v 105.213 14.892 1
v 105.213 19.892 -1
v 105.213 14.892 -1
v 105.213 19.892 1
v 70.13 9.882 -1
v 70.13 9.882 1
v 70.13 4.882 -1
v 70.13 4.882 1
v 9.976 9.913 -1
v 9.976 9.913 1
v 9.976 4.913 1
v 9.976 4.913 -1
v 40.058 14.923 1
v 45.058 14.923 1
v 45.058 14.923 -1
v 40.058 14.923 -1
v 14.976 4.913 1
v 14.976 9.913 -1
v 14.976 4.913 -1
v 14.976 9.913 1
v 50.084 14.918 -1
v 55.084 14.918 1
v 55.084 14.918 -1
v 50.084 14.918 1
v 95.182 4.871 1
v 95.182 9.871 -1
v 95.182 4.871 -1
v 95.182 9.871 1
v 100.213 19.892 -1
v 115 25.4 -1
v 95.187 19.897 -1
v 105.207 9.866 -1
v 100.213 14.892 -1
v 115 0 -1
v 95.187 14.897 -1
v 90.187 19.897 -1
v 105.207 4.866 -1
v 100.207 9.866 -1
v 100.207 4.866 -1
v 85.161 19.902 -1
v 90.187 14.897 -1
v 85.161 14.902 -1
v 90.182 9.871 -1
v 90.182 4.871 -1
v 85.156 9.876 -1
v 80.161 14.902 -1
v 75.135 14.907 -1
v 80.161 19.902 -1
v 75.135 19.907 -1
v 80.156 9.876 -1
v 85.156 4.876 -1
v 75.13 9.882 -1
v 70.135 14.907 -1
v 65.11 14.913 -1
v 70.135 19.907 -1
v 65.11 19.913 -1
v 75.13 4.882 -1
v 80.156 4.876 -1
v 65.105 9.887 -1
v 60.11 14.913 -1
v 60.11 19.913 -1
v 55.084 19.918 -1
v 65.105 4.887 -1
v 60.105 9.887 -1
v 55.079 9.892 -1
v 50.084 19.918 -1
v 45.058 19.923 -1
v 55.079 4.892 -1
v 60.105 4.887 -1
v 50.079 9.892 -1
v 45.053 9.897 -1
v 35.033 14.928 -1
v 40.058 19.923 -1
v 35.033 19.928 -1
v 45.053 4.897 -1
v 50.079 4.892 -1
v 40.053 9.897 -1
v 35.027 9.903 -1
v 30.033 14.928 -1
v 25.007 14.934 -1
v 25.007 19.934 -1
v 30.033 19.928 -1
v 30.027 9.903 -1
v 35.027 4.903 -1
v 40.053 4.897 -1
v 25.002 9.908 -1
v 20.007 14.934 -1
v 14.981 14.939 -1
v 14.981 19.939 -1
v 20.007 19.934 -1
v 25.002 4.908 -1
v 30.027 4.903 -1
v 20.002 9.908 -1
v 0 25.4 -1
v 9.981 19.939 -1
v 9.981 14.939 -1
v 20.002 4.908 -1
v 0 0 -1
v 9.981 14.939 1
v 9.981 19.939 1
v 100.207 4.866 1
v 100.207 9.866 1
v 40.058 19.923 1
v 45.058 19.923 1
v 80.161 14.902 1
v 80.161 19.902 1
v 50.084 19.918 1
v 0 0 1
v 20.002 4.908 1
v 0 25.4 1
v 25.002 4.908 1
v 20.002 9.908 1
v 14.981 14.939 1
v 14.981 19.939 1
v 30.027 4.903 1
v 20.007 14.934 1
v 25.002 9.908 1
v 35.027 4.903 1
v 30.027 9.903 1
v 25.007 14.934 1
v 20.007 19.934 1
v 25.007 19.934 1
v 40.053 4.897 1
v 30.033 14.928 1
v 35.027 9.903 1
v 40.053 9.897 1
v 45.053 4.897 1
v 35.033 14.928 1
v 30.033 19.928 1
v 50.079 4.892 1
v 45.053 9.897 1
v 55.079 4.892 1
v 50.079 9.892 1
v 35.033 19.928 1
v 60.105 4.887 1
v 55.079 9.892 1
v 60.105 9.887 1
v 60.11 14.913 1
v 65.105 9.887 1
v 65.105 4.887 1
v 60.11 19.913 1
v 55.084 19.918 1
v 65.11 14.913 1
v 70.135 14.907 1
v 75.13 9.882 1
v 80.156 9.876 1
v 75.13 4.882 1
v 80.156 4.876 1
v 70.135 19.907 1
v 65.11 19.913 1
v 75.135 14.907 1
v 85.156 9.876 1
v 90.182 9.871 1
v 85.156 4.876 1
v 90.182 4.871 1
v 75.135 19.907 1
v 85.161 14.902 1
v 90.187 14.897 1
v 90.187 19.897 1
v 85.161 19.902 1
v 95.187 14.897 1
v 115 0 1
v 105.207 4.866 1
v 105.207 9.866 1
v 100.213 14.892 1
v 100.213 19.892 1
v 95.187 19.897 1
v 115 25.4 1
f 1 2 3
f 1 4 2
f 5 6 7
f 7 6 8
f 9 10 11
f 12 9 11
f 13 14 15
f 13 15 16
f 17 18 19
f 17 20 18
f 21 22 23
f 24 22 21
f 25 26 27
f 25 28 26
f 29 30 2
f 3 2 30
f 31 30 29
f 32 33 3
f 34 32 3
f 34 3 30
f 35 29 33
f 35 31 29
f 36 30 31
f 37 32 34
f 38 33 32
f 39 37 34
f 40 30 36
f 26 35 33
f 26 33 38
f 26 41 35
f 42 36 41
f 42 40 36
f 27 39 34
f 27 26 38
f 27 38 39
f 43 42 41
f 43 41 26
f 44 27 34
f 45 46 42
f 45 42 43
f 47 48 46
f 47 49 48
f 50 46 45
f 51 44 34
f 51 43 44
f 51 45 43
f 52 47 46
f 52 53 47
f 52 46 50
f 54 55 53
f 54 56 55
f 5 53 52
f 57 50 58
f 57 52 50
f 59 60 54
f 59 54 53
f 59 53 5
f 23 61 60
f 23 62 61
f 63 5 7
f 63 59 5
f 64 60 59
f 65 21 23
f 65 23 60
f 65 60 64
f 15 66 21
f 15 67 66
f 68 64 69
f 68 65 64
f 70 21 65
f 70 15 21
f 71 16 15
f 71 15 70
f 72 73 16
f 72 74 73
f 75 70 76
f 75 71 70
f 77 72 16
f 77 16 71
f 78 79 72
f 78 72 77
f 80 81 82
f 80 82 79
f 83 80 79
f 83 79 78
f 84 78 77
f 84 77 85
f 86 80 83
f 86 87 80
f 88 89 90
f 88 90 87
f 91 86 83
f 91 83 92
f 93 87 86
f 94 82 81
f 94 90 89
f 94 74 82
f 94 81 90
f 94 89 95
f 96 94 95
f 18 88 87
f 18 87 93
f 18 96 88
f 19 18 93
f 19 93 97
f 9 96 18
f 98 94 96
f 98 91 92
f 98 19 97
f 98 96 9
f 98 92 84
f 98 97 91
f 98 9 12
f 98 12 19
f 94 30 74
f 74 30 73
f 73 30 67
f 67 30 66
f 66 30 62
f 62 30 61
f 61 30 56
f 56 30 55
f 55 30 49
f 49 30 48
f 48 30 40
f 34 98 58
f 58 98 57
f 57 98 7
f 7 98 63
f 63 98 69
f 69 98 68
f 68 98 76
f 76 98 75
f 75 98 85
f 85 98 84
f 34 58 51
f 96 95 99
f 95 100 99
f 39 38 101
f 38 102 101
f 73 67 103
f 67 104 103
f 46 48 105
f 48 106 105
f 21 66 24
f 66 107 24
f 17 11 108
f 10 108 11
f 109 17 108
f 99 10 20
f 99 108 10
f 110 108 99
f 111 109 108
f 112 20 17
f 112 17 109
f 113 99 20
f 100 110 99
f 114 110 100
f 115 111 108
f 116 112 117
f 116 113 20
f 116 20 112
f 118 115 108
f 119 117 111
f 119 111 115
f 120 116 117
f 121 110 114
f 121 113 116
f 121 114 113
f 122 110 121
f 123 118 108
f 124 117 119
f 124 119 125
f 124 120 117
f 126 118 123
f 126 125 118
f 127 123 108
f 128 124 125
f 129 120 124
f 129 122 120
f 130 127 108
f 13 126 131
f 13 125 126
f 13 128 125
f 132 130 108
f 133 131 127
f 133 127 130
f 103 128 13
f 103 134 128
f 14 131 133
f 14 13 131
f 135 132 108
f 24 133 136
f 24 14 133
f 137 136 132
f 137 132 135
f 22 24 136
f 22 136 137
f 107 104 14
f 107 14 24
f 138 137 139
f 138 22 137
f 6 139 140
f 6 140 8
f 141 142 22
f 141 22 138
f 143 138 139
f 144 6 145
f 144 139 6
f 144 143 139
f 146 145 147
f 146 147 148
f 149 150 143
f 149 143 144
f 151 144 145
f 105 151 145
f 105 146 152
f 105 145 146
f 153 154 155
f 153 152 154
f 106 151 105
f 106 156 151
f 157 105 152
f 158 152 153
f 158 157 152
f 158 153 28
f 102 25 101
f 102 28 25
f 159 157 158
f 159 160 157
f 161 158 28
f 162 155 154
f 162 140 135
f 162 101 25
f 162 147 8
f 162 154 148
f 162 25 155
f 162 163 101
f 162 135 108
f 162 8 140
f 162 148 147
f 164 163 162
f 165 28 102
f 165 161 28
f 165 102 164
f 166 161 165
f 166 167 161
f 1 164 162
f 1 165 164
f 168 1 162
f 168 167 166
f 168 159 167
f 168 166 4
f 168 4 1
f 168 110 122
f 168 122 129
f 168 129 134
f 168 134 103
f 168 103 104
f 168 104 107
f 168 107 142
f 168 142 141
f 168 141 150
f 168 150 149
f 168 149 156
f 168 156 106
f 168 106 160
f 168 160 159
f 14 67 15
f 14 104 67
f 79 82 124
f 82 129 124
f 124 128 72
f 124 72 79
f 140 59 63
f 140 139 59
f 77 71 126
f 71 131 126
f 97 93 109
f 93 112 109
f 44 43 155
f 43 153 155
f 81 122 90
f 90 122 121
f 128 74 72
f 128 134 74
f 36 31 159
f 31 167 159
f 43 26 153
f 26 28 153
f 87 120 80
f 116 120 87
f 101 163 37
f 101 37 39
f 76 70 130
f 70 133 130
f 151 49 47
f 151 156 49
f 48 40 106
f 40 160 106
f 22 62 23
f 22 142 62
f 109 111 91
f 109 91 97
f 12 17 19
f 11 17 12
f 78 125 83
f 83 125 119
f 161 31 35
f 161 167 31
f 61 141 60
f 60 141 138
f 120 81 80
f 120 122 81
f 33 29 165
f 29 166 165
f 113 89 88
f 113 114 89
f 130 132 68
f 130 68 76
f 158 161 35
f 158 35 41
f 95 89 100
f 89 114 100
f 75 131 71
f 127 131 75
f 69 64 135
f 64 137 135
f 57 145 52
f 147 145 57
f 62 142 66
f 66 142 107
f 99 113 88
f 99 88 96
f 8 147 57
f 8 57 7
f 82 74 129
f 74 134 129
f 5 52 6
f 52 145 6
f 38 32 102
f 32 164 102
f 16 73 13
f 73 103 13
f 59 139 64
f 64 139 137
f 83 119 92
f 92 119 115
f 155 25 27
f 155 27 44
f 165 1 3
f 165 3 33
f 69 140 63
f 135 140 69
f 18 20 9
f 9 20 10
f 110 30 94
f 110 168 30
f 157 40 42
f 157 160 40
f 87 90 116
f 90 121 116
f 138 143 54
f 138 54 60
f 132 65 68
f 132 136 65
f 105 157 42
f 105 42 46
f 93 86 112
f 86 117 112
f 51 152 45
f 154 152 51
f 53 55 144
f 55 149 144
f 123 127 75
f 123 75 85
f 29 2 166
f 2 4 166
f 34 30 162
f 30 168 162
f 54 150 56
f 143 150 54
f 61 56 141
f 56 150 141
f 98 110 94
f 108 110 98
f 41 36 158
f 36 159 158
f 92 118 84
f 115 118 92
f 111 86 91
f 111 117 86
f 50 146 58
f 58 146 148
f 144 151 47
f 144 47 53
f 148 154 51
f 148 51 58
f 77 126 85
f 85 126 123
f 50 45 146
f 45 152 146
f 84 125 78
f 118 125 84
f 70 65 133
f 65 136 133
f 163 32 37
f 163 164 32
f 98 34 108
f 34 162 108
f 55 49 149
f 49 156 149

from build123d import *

# Parameters (mm, degrees)
BOX_W               = 115
BOX_H               = 25.4
BOX_DEPTH           = 1
SKETCH_W            = 5
SKETCH_H            = 5
POCKET_DEPTH        = 0.001
POCKET_FACE24_W     = 5
POCKET_FACE24_H     = 5
POCKET001_DEPTH     = 5
POCKET001_FACE12_W  = 5
POCKET001_FACE12_H  = 5
POCKET002_DEPTH     = 5
POCKET002_FACE17_W  = 5
POCKET002_FACE17_H  = 5
POCKET003_DEPTH     = 1.001
POCKET003_FACE20_W  = 5
POCKET003_FACE20_H  = 5
POCKET004_DEPTH     = 5
POCKET004_FACE28_W  = 5
POCKET004_FACE28_H  = 5
POCKET005_DEPTH     = 5
POCKET005_FACE32_W  = 5
POCKET005_FACE32_H  = 5
POCKET006_DEPTH     = 5
POCKET006_FACE35_W  = 5
POCKET006_FACE35_H  = 5
POCKET007_DEPTH     = 5
POCKET007_FACE38_W  = 5
POCKET007_FACE38_H  = 5
POCKET008_DEPTH     = 5
POCKET008_FACE46_W  = 5
POCKET008_FACE46_H  = 5
POCKET009_DEPTH     = 5
POCKET009_FACE52_W  = 5
POCKET009_FACE52_H  = 5
POCKET010_DEPTH     = 5
POCKET010_FACE55_W  = 5
POCKET010_FACE55_H  = 5
POCKET011_DEPTH     = 5
POCKET011_FACE51_W  = 5
POCKET011_FACE51_H  = 5
POCKET012_DEPTH     = 5
POCKET012_FACE56_W  = 5
POCKET012_FACE56_H  = 5
POCKET013_DEPTH     = 5
POCKET013_FACE59_W  = 5
POCKET013_FACE59_H  = 5
POCKET014_DEPTH     = 5
POCKET014_FACE63_W  = 5
POCKET014_FACE63_H  = 5
POCKET015_DEPTH     = 5
POCKET015_FACE68_W  = 5
POCKET015_FACE68_H  = 5
POCKET016_DEPTH     = 5
POCKET016_FACE72_W  = 5
POCKET016_FACE72_H  = 5
POCKET017_DEPTH     = 5
POCKET017_FACE76_W  = 5
POCKET017_FACE76_H  = 5
POCKET018_DEPTH     = 5
POCKET018_FACE80_W  = 5
POCKET018_FACE80_H  = 5
POCKET019_DEPTH     = 5
POCKET019_FACE83_W  = 5
POCKET019_FACE83_H  = 5
POCKET020_DEPTH     = 5
POCKET020_FACE5_W   = 25.4
POCKET020_FACE5_H   = 115
POCKET020_FACE5_W_2 = 5
POCKET020_FACE5_H_2 = 5
PAD_DEPTH           = 1


with BuildPart() as part:
    # Box → Box (new body)
    with BuildSketch(Plane.XY):
        with Locations((57.5, 12.7)):
            Rectangle(BOX_W, BOX_H)
    extrude(amount=BOX_DEPTH)

    # Sketch → Pocket (cut, through all)
    with BuildSketch(Plane.XY):
        with Locations((12.481102, 17.438787)):
            Rectangle(SKETCH_W, SKETCH_H)
        with Locations((22.506832, 17.433556)):
            Rectangle(SKETCH_W, SKETCH_H)
        with Locations((32.532562, 17.428325)):
            Rectangle(SKETCH_W, SKETCH_H)
        with Locations((42.558292, 17.423094)):
            Rectangle(SKETCH_W, SKETCH_H)
        with Locations((52.584022, 17.417863)):
            Rectangle(SKETCH_W, SKETCH_H)
        with Locations((62.609752, 17.412632)):
            Rectangle(SKETCH_W, SKETCH_H)
        with Locations((72.635482, 17.407401)):
            Rectangle(SKETCH_W, SKETCH_H)
        with Locations((82.661212, 17.40217)):
            Rectangle(SKETCH_W, SKETCH_H)
        with Locations((92.686942, 17.396939)):
            Rectangle(SKETCH_W, SKETCH_H)
        with Locations((102.712672, 17.391708)):
            Rectangle(SKETCH_W, SKETCH_H)
        with Locations((12.475871, 7.413057)):
            Rectangle(SKETCH_W, SKETCH_H)
        with Locations((22.501601, 7.407826)):
            Rectangle(SKETCH_W, SKETCH_H)
        with Locations((32.527331, 7.402595)):
            Rectangle(SKETCH_W, SKETCH_H)
        with Locations((42.553061, 7.397364)):
            Rectangle(SKETCH_W, SKETCH_H)
        with Locations((52.578791, 7.392133)):
            Rectangle(SKETCH_W, SKETCH_H)
        with Locations((62.604521, 7.386902)):
            Rectangle(SKETCH_W, SKETCH_H)
        with Locations((72.630251, 7.381671)):
            Rectangle(SKETCH_W, SKETCH_H)
        with Locations((82.655981, 7.37644)):
            Rectangle(SKETCH_W, SKETCH_H)
        with Locations((92.681711, 7.371209)):
            Rectangle(SKETCH_W, SKETCH_H)
        with Locations((102.707441, 7.365978)):
            Rectangle(SKETCH_W, SKETCH_H)
    extrude(amount=-POCKET_DEPTH, mode=Mode.SUBTRACT)

    # Pocket Face24 → Pocket001 (cut)
    with BuildSketch(Plane(origin=(102.712672, 17.391708, 0), x_dir=(0, -1, 0), z_dir=(0, 0, -1))):
        Rectangle(POCKET_FACE24_W, POCKET_FACE24_H)
    extrude(amount=-POCKET001_DEPTH, mode=Mode.SUBTRACT)

    # Pocket001 Face12 → Pocket002 (cut)
    with BuildSketch(Plane(origin=(92.686942, 17.396939, 0), x_dir=(0, -1, 0), z_dir=(0, 0, -1))):
        Rectangle(POCKET001_FACE12_W, POCKET001_FACE12_H)
    extrude(amount=-POCKET002_DEPTH, mode=Mode.SUBTRACT)

    # Pocket002 Face17 → Pocket003 (cut, through all)
    with BuildSketch(Plane(origin=(82.661212, 17.40217, 0), x_dir=(0, -1, 0), z_dir=(0, 0, -1))):
        Rectangle(POCKET002_FACE17_W, POCKET002_FACE17_H)
    extrude(amount=-POCKET003_DEPTH, mode=Mode.SUBTRACT)

    # Pocket003 Face20 → Pocket004 (cut)
    with BuildSketch(Plane(origin=(72.635482, 17.407401, 0), x_dir=(0, -1, 0), z_dir=(0, 0, -1))):
        Rectangle(POCKET003_FACE20_W, POCKET003_FACE20_H)
    extrude(amount=-POCKET004_DEPTH, mode=Mode.SUBTRACT)

    # Pocket004 Face28 → Pocket005 (cut)
    with BuildSketch(Plane(origin=(62.609752, 17.412632, 0), x_dir=(0, -1, 0), z_dir=(0, 0, -1))):
        Rectangle(POCKET004_FACE28_W, POCKET004_FACE28_H)
    extrude(amount=-POCKET005_DEPTH, mode=Mode.SUBTRACT)

    # Pocket005 Face32 → Pocket006 (cut)
    with BuildSketch(Plane(origin=(52.584022, 17.417863, 0), x_dir=(0, -1, 0), z_dir=(0, 0, -1))):
        Rectangle(POCKET005_FACE32_W, POCKET005_FACE32_H)
    extrude(amount=-POCKET006_DEPTH, mode=Mode.SUBTRACT)

    # Pocket006 Face35 → Pocket007 (cut)
    with BuildSketch(Plane(origin=(42.558292, 17.423094, 0), x_dir=(0, -1, 0), z_dir=(0, 0, -1))):
        Rectangle(POCKET006_FACE35_W, POCKET006_FACE35_H)
    extrude(amount=-POCKET007_DEPTH, mode=Mode.SUBTRACT)

    # Pocket007 Face38 → Pocket008 (cut)
    with BuildSketch(Plane(origin=(32.532562, 17.428325, 0), x_dir=(0, -1, 0), z_dir=(0, 0, -1))):
        Rectangle(POCKET007_FACE38_W, POCKET007_FACE38_H)
    extrude(amount=-POCKET008_DEPTH, mode=Mode.SUBTRACT)

    # Pocket008 Face46 → Pocket009 (cut)
    with BuildSketch(Plane(origin=(22.506832, 17.433556, 0), x_dir=(0, -1, 0), z_dir=(0, 0, -1))):
        Rectangle(POCKET008_FACE46_W, POCKET008_FACE46_H)
    extrude(amount=-POCKET009_DEPTH, mode=Mode.SUBTRACT)

    # Pocket009 Face52 → Pocket010 (cut)
    with BuildSketch(Plane(origin=(12.481102, 17.438787, 0), x_dir=(0, -1, 0), z_dir=(0, 0, -1))):
        Rectangle(POCKET009_FACE52_W, POCKET009_FACE52_H)
    extrude(amount=-POCKET010_DEPTH, mode=Mode.SUBTRACT)

    # Pocket010 Face55 → Pocket011 (cut)
    with BuildSketch(Plane(origin=(102.707441, 7.365978, 0), x_dir=(0, -1, 0), z_dir=(0, 0, -1))):
        Rectangle(POCKET010_FACE55_W, POCKET010_FACE55_H)
    extrude(amount=-POCKET011_DEPTH, mode=Mode.SUBTRACT)

    # Pocket011 Face51 → Pocket012 (cut)
    with BuildSketch(Plane(origin=(92.681711, 7.371209, 0), x_dir=(0, -1, 0), z_dir=(0, 0, -1))):
        Rectangle(POCKET011_FACE51_W, POCKET011_FACE51_H)
    extrude(amount=-POCKET012_DEPTH, mode=Mode.SUBTRACT)

    # Pocket012 Face56 → Pocket013 (cut)
    with BuildSketch(Plane(origin=(82.655981, 7.37644, 0), x_dir=(0, -1, 0), z_dir=(0, 0, -1))):
        Rectangle(POCKET012_FACE56_W, POCKET012_FACE56_H)
    extrude(amount=-POCKET013_DEPTH, mode=Mode.SUBTRACT)

    # Pocket013 Face59 → Pocket014 (cut)
    with BuildSketch(Plane(origin=(72.630251, 7.381671, 0), x_dir=(0, -1, 0), z_dir=(0, 0, -1))):
        Rectangle(POCKET013_FACE59_W, POCKET013_FACE59_H)
    extrude(amount=-POCKET014_DEPTH, mode=Mode.SUBTRACT)

    # Pocket014 Face63 → Pocket015 (cut)
    with BuildSketch(Plane(origin=(62.604521, 7.386902, 0), x_dir=(0, -1, 0), z_dir=(0, 0, -1))):
        Rectangle(POCKET014_FACE63_W, POCKET014_FACE63_H)
    extrude(amount=-POCKET015_DEPTH, mode=Mode.SUBTRACT)

    # Pocket015 Face68 → Pocket016 (cut)
    with BuildSketch(Plane(origin=(42.553061, 7.397364, 0), x_dir=(0, -1, 0), z_dir=(0, 0, -1))):
        Rectangle(POCKET015_FACE68_W, POCKET015_FACE68_H)
    extrude(amount=-POCKET016_DEPTH, mode=Mode.SUBTRACT)

    # Pocket016 Face72 → Pocket017 (cut)
    with BuildSketch(Plane(origin=(32.527331, 7.402595, 0), x_dir=(0, -1, 0), z_dir=(0, 0, -1))):
        Rectangle(POCKET016_FACE72_W, POCKET016_FACE72_H)
    extrude(amount=-POCKET017_DEPTH, mode=Mode.SUBTRACT)

    # Pocket017 Face76 → Pocket018 (cut)
    with BuildSketch(Plane(origin=(22.501601, 7.407826, 0), x_dir=(0, -1, 0), z_dir=(0, 0, -1))):
        Rectangle(POCKET017_FACE76_W, POCKET017_FACE76_H)
    extrude(amount=-POCKET018_DEPTH, mode=Mode.SUBTRACT)

    # Pocket018 Face80 → Pocket019 (cut)
    with BuildSketch(Plane(origin=(12.475871, 7.413057, 0), x_dir=(0, -1, 0), z_dir=(0, 0, -1))):
        Rectangle(POCKET018_FACE80_W, POCKET018_FACE80_H)
    extrude(amount=-POCKET019_DEPTH, mode=Mode.SUBTRACT)

    # Pocket019 Face83 → Pocket020 (cut)
    with BuildSketch(Plane(origin=(52.578791, 7.392133, 0), x_dir=(0, -1, 0), z_dir=(0, 0, -1))):
        Rectangle(POCKET019_FACE83_W, POCKET019_FACE83_H)
    extrude(amount=-POCKET020_DEPTH, mode=Mode.SUBTRACT)

    # Pocket020 Face5 → Pad (add)
    with BuildSketch(Plane(origin=(57.48053, 12.761466, 0), x_dir=(0, -1, 0), z_dir=(0, 0, -1))):
        with Locations((0.061466, -0.01947)):
            Rectangle(POCKET020_FACE5_W, POCKET020_FACE5_H)
        with Locations((5.390257, -35.201181)):
            Rectangle(POCKET020_FACE5_W_2, POCKET020_FACE5_H_2, mode=Mode.SUBTRACT)
        with Locations((-4.635473, -35.206412)):
            Rectangle(POCKET020_FACE5_W_2, POCKET020_FACE5_H_2, mode=Mode.SUBTRACT)
        with Locations((-4.645935, -15.154952)):
            Rectangle(POCKET020_FACE5_W_2, POCKET020_FACE5_H_2, mode=Mode.SUBTRACT)
        with Locations((-4.640704, -25.180682)):
            Rectangle(POCKET020_FACE5_W_2, POCKET020_FACE5_H_2, mode=Mode.SUBTRACT)
        with Locations((5.379795, -15.149721)):
            Rectangle(POCKET020_FACE5_W_2, POCKET020_FACE5_H_2, mode=Mode.SUBTRACT)
        with Locations((5.385026, -25.175451)):
            Rectangle(POCKET020_FACE5_W_2, POCKET020_FACE5_H_2, mode=Mode.SUBTRACT)
        with Locations((-4.666859, 24.947968)):
            Rectangle(POCKET020_FACE5_W_2, POCKET020_FACE5_H_2, mode=Mode.SUBTRACT)
        with Locations((-4.661628, 14.922238)):
            Rectangle(POCKET020_FACE5_W_2, POCKET020_FACE5_H_2, mode=Mode.SUBTRACT)
        with Locations((-4.651166, -5.129222)):
            Rectangle(POCKET020_FACE5_W_2, POCKET020_FACE5_H_2, mode=Mode.SUBTRACT)
        with Locations((-4.656397, 4.896508)):
            Rectangle(POCKET020_FACE5_W_2, POCKET020_FACE5_H_2, mode=Mode.SUBTRACT)
        with Locations((5.374564, -5.123991)):
            Rectangle(POCKET020_FACE5_W_2, POCKET020_FACE5_H_2, mode=Mode.SUBTRACT)
        with Locations((5.369333, 4.901739)):
            Rectangle(POCKET020_FACE5_W_2, POCKET020_FACE5_H_2, mode=Mode.SUBTRACT)
        with Locations((5.364102, 14.927469)):
            Rectangle(POCKET020_FACE5_W_2, POCKET020_FACE5_H_2, mode=Mode.SUBTRACT)
        with Locations((5.358871, 24.953199)):
            Rectangle(POCKET020_FACE5_W_2, POCKET020_FACE5_H_2, mode=Mode.SUBTRACT)
        with Locations((-4.67209, 34.973698)):
            Rectangle(POCKET020_FACE5_W_2, POCKET020_FACE5_H_2, mode=Mode.SUBTRACT)
        with Locations((5.35364, 34.978929)):
            Rectangle(POCKET020_FACE5_W_2, POCKET020_FACE5_H_2, mode=Mode.SUBTRACT)
        with Locations((5.395488, -45.226911)):
            Rectangle(POCKET020_FACE5_W_2, POCKET020_FACE5_H_2, mode=Mode.SUBTRACT)
        with Locations((-4.630242, -45.232142)):
            Rectangle(POCKET020_FACE5_W_2, POCKET020_FACE5_H_2, mode=Mode.SUBTRACT)
        with Locations((-4.677321, 44.999428)):
            Rectangle(POCKET020_FACE5_W_2, POCKET020_FACE5_H_2, mode=Mode.SUBTRACT)
        with Locations((5.348409, 45.004659)):
            Rectangle(POCKET020_FACE5_W_2, POCKET020_FACE5_H_2, mode=Mode.SUBTRACT)
    extrude(amount=PAD_DEPTH)


solid = part.part
